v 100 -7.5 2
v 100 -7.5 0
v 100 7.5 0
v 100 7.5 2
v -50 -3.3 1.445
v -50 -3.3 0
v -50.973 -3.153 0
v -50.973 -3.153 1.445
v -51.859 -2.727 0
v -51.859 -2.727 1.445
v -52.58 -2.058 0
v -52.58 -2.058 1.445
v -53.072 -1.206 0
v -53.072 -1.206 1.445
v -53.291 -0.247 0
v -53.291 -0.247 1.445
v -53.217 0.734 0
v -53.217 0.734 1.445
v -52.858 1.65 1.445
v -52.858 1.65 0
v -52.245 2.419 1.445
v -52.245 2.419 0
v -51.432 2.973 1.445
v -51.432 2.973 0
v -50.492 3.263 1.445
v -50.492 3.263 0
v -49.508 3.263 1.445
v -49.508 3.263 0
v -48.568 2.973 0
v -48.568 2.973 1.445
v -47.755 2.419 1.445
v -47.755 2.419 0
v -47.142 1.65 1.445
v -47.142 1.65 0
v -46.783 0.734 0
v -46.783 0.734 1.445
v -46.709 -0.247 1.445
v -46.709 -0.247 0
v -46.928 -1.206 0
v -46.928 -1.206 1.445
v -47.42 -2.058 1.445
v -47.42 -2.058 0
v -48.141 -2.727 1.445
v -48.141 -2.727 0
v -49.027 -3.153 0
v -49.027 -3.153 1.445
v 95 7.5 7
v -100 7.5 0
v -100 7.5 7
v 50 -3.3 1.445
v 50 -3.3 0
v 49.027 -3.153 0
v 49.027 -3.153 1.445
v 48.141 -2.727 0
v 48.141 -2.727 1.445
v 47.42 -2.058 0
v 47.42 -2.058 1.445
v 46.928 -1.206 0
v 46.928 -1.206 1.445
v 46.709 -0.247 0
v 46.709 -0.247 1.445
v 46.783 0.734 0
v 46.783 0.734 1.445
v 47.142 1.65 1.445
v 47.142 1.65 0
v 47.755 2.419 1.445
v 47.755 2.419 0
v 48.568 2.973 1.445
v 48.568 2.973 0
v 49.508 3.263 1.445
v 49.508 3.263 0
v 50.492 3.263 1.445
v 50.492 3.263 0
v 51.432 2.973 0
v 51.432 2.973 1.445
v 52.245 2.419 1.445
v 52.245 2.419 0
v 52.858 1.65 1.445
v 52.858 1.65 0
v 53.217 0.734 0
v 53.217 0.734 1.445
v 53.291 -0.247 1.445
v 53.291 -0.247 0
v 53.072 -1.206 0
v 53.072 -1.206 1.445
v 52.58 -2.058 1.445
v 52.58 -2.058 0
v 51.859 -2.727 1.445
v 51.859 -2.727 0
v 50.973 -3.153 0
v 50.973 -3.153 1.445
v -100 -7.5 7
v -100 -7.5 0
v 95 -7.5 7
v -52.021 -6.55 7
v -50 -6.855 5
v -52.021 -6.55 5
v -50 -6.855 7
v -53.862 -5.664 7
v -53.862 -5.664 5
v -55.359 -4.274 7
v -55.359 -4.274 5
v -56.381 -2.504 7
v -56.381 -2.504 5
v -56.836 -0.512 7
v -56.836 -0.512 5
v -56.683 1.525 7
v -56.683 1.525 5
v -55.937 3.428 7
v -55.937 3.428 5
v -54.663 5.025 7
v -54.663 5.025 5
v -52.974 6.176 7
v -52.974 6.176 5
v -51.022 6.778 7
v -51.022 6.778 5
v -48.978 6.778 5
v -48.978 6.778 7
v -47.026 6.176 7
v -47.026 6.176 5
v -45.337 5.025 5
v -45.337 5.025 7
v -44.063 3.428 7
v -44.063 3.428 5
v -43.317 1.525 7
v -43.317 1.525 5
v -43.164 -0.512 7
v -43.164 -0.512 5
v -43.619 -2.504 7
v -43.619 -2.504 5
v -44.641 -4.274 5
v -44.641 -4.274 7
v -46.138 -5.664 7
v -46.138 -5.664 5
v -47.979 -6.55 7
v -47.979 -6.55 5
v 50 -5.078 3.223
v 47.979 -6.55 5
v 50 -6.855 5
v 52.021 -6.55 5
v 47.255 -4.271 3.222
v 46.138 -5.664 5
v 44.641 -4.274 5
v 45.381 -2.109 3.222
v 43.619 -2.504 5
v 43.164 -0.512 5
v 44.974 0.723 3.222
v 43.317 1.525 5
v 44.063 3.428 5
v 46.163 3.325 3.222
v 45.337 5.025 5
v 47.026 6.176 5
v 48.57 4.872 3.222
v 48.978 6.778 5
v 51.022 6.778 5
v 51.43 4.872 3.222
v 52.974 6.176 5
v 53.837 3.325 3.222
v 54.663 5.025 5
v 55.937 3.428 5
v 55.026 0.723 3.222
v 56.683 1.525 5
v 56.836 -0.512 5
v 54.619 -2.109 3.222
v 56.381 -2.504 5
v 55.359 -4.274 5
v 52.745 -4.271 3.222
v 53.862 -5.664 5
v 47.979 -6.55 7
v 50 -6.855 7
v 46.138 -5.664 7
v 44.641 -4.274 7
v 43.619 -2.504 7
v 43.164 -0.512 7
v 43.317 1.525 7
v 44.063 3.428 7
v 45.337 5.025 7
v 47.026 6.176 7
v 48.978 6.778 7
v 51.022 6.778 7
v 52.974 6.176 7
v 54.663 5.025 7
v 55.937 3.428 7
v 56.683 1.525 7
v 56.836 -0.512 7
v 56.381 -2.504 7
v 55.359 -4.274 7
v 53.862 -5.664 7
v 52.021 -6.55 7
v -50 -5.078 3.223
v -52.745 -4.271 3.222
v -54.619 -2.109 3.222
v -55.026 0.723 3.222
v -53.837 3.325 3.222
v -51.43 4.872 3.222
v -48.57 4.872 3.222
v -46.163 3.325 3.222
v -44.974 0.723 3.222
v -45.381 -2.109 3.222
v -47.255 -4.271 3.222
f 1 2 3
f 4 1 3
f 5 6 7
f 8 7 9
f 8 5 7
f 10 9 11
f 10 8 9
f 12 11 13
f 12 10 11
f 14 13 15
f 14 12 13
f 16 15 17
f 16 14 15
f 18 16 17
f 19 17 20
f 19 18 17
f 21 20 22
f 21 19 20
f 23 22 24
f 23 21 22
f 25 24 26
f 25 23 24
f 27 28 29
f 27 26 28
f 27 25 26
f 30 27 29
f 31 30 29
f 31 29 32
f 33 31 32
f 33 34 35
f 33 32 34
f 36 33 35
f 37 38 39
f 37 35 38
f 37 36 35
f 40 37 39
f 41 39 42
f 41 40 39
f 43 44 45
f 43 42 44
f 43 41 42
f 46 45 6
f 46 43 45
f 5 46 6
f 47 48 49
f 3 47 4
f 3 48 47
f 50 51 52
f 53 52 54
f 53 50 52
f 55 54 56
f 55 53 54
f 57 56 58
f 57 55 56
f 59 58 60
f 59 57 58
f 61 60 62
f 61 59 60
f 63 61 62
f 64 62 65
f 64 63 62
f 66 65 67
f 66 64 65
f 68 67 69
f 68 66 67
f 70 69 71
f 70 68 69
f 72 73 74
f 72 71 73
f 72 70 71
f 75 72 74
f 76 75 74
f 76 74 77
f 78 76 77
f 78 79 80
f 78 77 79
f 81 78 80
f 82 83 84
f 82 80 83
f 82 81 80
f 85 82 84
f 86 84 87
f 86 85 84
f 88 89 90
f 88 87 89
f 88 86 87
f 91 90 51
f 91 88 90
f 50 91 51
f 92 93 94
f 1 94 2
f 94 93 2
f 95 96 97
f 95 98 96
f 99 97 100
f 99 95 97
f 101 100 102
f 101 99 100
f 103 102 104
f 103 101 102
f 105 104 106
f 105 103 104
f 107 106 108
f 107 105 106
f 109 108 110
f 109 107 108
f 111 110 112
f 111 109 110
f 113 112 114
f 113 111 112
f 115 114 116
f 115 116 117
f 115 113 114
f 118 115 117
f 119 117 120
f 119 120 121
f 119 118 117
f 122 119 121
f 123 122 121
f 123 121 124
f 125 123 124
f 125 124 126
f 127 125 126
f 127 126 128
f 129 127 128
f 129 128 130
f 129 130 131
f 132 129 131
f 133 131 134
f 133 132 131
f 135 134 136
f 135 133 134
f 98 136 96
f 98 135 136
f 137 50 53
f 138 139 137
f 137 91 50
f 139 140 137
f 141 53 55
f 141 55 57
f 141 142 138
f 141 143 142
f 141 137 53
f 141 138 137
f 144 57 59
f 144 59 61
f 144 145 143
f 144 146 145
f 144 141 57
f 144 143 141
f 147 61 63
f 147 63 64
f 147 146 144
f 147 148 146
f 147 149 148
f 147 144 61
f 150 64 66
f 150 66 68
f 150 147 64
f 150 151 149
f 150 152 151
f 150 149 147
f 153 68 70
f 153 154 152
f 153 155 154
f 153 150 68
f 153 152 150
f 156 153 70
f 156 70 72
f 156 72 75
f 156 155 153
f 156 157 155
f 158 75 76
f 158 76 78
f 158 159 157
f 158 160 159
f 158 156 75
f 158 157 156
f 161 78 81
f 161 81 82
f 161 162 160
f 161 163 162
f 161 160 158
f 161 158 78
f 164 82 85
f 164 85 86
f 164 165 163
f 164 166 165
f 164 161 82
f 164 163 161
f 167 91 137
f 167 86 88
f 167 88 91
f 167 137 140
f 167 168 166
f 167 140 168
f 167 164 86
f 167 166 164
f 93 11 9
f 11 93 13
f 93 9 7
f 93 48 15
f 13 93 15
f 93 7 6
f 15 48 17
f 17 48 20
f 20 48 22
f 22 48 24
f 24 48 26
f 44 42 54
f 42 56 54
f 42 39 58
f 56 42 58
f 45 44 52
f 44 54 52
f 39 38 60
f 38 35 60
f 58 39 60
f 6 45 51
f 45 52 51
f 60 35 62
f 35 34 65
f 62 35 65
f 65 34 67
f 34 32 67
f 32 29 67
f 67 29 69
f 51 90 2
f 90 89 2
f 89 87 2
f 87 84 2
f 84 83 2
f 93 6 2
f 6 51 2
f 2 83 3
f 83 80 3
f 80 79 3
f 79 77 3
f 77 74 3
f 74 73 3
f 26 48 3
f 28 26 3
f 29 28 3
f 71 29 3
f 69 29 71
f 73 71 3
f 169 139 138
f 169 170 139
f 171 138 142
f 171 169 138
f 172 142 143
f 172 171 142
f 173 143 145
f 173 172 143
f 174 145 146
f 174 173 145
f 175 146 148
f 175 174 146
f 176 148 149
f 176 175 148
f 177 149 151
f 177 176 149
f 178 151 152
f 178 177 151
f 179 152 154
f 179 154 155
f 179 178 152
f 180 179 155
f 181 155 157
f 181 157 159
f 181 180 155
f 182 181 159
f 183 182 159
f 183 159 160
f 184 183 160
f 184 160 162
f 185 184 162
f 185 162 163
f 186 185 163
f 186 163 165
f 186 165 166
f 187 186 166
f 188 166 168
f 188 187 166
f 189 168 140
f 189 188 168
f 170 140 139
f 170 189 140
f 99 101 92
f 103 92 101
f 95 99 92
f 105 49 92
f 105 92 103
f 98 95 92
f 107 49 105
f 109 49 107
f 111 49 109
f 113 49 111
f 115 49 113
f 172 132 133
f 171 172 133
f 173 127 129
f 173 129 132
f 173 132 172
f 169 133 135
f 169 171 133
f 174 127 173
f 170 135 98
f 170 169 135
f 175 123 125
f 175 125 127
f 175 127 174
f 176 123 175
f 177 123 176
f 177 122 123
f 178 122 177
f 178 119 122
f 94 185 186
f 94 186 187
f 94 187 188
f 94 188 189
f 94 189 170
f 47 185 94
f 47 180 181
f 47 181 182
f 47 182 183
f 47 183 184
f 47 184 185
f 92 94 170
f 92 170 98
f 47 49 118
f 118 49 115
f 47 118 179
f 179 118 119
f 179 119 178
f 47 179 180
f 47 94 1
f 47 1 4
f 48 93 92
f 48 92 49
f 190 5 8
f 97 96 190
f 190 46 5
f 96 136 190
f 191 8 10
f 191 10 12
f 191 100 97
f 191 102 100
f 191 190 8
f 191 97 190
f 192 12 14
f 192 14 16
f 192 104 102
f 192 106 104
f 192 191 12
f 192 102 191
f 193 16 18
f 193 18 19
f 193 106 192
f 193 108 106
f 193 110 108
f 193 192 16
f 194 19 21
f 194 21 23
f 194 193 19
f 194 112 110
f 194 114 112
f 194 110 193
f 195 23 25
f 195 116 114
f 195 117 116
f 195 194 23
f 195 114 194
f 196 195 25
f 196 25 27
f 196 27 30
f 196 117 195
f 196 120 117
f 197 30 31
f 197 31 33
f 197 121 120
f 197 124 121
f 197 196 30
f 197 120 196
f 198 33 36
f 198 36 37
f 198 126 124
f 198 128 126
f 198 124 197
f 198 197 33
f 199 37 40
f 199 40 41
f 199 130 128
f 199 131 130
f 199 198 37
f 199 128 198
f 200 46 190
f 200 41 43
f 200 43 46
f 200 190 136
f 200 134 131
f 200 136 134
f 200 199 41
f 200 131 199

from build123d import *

# Parameters (mm, degrees)
SKETCH_1_W                 = 200
SKETCH_1_H                 = 15
EXTRUDE_1_DEPTH            = 7
CHAMFER_1_SIZE             = 5
HOLE_WIZARD_M61_AT_2_COUNT = 2
HOLE_WIZARD_M61_AT_2_PITCH = 100


with BuildPart() as part:
    # Эскиз1 → Бобышка-Вытянуть1 (new body)
    with BuildSketch(Plane.XY):
        Rectangle(SKETCH_1_W, SKETCH_1_H)
    extrude(amount=EXTRUDE_1_DEPTH)

    # Фаска1
    chamfer_1_edges = [part.edges().sort_by_distance(p)[0] for p in [
        (100, 0, 7),
    ]]
    chamfer(chamfer_1_edges, length=CHAMFER_1_SIZE)

    # Эскиз4 → Зенковка для винта с потайной головкой и внутренним шестигранником M61 (revolve, cut)
    with BuildSketch(Plane(origin=(-50, 0, 7), x_dir=(0, -1, 0), z_dir=(1, 0, 0))):
        Polygon((0, 0), (0, 31.982840043), (3.3, 30), (3.3, 5.555), (6.855, 2), (6.855, 0), align=None)
    hole_wizard_m61 = revolve(axis=Axis((-50, 0, 13.35), (0, 0, -1)), mode=Mode.SUBTRACT)

    # Зенковка для винта с потайной головкой и внутренним шестигранником M61 at 2: Зенковка для винта с потайной головкой и внутренним шестигранником M61 ×2
    with Locations(*[(i * HOLE_WIZARD_M61_AT_2_PITCH, 0, 0) for i in range(1, HOLE_WIZARD_M61_AT_2_COUNT)]):
        add(hole_wizard_m61, mode=Mode.SUBTRACT)


solid = part.part
